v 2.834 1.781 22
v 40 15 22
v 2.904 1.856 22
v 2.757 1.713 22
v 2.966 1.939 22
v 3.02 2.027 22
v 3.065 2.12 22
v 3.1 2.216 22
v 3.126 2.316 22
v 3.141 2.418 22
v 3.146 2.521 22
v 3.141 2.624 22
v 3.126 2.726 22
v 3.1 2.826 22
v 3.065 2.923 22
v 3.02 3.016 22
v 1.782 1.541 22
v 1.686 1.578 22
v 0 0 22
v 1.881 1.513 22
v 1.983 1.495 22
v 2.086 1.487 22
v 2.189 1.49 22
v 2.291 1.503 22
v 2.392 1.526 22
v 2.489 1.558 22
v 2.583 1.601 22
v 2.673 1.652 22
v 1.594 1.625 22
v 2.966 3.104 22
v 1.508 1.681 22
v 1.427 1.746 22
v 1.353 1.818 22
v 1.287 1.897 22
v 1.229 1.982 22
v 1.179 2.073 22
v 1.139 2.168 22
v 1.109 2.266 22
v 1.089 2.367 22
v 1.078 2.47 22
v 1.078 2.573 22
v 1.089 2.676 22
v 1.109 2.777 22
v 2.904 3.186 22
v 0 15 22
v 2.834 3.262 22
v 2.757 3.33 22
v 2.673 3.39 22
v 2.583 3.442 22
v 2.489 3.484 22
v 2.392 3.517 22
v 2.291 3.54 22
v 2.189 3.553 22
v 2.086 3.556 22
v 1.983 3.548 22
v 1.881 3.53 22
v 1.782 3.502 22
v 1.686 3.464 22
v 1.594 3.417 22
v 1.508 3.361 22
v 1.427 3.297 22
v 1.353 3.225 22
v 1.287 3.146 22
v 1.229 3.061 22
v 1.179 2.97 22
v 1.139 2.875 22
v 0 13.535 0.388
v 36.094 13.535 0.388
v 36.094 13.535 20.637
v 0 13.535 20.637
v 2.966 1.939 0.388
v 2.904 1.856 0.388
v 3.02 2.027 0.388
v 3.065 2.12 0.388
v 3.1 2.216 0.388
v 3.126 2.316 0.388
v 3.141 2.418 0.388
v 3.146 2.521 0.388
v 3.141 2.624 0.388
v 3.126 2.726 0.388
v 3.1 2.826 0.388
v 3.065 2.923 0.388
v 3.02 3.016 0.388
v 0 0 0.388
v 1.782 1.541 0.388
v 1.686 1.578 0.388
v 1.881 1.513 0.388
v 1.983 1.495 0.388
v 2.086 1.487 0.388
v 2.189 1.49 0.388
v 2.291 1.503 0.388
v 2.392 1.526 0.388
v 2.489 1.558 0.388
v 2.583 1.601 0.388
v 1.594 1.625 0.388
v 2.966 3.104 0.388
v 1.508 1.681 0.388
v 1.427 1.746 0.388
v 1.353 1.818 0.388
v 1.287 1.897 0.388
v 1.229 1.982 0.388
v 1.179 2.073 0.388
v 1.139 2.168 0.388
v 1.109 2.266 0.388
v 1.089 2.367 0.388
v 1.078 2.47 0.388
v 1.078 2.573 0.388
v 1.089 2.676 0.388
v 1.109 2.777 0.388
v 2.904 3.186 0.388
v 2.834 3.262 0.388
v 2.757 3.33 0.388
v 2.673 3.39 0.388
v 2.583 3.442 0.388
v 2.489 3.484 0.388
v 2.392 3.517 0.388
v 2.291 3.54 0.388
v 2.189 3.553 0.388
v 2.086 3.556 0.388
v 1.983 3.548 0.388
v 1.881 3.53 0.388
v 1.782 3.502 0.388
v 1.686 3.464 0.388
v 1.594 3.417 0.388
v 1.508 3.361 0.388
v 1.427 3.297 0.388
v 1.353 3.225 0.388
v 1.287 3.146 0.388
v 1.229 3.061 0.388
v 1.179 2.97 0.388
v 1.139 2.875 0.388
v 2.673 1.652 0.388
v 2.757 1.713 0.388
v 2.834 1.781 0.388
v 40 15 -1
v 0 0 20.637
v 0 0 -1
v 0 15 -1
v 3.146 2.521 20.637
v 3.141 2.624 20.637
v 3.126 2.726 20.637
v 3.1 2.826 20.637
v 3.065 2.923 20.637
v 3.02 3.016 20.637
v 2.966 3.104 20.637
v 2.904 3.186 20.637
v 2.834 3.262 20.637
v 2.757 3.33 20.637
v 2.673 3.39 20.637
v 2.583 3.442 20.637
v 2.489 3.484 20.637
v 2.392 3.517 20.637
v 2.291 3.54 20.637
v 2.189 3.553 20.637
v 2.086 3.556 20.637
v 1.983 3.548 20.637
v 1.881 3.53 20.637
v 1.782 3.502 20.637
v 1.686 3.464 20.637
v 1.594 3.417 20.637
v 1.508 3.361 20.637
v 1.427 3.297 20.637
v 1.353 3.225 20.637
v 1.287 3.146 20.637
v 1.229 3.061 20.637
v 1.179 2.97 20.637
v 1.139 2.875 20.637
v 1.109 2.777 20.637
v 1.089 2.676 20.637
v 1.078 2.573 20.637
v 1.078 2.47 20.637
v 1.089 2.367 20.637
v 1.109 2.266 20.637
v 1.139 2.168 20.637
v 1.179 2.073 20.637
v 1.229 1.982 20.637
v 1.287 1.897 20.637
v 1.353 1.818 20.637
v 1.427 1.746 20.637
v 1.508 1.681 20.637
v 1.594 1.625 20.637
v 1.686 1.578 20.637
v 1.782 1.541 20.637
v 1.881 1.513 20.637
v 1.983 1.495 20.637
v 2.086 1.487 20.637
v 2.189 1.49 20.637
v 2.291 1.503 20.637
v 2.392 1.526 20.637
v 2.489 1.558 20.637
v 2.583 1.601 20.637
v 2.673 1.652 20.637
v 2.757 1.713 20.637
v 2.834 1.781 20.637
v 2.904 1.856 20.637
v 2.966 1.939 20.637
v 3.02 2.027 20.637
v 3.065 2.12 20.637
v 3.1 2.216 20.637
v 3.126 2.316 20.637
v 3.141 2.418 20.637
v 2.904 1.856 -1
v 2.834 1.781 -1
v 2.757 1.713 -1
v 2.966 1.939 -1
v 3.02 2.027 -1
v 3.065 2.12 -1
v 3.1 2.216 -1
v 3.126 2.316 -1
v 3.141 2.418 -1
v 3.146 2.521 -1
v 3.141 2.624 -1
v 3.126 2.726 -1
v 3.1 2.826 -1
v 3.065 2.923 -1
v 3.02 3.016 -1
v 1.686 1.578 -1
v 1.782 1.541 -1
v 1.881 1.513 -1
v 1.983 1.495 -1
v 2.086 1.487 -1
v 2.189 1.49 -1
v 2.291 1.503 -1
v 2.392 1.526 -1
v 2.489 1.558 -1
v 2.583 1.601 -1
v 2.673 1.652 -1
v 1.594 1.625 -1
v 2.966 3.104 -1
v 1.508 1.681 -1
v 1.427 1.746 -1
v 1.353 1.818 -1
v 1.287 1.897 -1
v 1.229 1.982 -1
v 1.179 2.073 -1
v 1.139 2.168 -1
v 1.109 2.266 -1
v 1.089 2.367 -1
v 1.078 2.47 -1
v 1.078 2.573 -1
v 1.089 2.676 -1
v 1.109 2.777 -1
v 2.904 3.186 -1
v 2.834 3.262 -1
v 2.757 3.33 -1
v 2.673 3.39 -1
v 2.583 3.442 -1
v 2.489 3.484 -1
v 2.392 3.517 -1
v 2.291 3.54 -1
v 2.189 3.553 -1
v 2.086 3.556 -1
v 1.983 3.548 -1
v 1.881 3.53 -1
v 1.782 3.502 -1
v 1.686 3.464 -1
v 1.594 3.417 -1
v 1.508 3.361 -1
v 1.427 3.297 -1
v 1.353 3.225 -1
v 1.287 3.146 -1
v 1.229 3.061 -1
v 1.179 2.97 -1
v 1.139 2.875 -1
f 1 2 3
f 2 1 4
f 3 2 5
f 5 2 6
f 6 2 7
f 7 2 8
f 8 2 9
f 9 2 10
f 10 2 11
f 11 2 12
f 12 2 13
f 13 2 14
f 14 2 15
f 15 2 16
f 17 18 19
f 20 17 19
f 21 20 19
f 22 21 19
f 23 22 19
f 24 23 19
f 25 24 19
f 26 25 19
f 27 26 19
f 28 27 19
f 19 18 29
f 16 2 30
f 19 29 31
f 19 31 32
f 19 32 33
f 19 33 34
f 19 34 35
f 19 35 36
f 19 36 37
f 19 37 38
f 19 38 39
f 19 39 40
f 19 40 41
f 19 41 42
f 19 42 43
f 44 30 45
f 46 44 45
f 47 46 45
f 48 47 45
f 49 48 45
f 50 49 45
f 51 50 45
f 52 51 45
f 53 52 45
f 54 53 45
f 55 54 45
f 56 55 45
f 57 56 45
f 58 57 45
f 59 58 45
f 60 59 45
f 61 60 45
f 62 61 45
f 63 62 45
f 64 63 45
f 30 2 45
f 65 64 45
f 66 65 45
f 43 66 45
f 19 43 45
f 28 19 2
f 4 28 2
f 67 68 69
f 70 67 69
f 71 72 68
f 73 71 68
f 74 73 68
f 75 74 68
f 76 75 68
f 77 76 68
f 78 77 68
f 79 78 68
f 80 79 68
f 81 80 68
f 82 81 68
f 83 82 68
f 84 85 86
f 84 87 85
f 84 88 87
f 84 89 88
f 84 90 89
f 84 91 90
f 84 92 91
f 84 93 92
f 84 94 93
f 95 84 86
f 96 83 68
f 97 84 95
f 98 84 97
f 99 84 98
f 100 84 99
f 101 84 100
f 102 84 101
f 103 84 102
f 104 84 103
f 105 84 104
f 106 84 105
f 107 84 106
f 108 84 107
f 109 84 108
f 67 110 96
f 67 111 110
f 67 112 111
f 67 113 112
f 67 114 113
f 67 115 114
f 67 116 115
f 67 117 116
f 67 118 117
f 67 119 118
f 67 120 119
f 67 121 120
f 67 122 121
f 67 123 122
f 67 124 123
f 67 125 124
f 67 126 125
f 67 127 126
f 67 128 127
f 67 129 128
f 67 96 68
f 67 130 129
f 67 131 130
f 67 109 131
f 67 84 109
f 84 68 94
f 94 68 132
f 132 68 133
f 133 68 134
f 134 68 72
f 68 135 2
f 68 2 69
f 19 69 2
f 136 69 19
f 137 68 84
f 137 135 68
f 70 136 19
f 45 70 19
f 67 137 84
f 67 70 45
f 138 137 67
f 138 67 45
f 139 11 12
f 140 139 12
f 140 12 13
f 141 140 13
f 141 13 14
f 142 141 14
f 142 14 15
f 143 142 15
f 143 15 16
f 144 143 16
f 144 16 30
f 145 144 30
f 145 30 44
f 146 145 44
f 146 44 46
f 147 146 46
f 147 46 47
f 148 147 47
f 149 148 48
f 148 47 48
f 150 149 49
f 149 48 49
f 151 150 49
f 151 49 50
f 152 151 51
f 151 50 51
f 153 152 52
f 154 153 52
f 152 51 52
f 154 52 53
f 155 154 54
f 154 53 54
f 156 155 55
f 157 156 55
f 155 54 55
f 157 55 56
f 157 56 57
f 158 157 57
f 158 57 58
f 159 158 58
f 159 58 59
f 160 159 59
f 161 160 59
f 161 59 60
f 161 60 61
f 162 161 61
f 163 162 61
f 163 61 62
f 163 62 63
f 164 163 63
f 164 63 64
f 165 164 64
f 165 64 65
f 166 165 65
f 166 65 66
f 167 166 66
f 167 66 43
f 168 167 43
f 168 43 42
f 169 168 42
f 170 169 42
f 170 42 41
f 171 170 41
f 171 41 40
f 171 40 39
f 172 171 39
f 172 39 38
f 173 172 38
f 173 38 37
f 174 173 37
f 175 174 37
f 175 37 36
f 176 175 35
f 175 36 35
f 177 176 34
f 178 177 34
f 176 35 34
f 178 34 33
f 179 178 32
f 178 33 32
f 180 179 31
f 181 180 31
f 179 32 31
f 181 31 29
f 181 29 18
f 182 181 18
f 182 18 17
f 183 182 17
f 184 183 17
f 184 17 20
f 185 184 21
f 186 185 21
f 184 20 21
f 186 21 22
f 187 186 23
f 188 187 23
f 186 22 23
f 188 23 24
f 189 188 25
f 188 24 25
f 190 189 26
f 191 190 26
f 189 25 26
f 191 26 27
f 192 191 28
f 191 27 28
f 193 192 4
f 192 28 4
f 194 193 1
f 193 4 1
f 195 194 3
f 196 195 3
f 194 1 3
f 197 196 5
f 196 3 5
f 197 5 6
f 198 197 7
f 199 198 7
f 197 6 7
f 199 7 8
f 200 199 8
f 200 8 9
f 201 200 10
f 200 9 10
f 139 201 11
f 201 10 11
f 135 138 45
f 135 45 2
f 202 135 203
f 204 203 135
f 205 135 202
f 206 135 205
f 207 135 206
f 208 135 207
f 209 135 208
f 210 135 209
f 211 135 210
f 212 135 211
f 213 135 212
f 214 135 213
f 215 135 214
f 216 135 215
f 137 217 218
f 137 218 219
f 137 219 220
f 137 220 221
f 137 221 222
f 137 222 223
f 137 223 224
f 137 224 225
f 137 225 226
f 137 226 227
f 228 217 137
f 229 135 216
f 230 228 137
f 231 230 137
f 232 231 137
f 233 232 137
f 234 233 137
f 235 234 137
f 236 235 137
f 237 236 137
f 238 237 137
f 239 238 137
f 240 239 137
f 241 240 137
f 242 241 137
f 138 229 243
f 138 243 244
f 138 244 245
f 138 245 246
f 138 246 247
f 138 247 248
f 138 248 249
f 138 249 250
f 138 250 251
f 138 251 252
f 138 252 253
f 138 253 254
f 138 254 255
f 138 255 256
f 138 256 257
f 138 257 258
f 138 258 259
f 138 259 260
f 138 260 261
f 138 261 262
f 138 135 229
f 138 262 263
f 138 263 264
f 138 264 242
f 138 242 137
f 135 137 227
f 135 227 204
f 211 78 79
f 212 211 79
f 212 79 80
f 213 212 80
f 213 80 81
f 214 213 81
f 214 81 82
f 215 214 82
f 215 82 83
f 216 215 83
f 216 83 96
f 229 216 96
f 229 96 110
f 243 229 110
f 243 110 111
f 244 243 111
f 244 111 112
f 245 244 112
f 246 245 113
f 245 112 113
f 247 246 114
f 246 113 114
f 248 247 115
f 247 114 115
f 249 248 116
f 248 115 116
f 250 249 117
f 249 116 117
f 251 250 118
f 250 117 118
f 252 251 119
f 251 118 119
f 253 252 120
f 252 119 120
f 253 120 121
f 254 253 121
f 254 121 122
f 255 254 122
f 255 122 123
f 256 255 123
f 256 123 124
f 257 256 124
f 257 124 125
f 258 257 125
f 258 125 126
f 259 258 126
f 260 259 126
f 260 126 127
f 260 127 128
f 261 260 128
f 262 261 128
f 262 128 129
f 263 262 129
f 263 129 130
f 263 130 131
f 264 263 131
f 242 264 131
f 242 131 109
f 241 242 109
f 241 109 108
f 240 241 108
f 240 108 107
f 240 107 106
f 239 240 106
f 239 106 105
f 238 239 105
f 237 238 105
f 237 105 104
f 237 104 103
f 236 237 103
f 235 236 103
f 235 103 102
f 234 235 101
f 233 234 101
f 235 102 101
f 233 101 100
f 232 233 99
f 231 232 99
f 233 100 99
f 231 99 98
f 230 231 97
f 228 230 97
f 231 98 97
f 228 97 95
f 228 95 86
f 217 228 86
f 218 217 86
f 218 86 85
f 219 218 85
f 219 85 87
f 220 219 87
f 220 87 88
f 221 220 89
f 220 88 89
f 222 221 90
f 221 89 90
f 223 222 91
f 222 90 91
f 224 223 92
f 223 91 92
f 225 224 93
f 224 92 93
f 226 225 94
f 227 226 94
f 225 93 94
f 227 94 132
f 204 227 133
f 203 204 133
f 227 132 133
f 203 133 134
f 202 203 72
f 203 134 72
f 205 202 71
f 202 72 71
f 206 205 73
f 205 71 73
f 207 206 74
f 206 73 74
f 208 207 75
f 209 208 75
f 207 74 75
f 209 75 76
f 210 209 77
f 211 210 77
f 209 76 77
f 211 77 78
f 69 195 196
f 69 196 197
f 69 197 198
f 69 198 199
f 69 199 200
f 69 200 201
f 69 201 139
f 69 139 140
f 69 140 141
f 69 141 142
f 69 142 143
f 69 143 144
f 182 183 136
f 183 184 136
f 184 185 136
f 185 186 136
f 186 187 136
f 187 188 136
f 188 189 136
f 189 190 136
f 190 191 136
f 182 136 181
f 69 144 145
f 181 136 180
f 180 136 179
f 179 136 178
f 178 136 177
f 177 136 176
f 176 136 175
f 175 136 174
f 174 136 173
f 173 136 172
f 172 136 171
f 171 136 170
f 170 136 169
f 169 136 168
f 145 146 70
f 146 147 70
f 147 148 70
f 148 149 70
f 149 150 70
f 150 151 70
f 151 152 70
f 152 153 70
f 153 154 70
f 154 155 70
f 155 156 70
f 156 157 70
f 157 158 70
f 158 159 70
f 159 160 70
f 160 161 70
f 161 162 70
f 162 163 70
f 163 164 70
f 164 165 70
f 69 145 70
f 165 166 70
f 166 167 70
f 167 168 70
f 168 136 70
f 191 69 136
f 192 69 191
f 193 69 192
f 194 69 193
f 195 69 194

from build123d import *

# Parameters (mm, degrees)
BOSS_EXTRUDE2_DEPTH      = 22
BOSS_EXTRUDE2_DEPTH_BACK = 1
SKETCH2_W                = 20.249570214
SKETCH2_H                = 13.731042716
CUT_EXTRUDE1_DEPTH       = 43
SKETCH3_R                = 1.034515854
CUT_EXTRUDE2_DEPTH       = 43


with BuildPart() as part:
    # Sketch1 → Boss-Extrude2 (new, two sides: drawn at the far end of the back side and taken through both)
    with BuildSketch(Plane.XY.offset(-BOSS_EXTRUDE2_DEPTH_BACK)):
        Polygon((0, 0), (0, 15), (40, 15), align=None)
    extrude(amount=BOSS_EXTRUDE2_DEPTH + BOSS_EXTRUDE2_DEPTH_BACK)

    # Sketch2 → Cut-Extrude1 (cut)
    with BuildSketch(Plane.ZY):
        with Locations((10.512392638, 6.669693265)):
            Rectangle(SKETCH2_W, SKETCH2_H)
    extrude(amount=-CUT_EXTRUDE1_DEPTH, mode=Mode.SUBTRACT)

    # Sketch3 → Cut-Extrude2 (cut)
    with BuildSketch(Plane.XY.offset(22)):
        with Locations((2.111496697, 2.521392454)):
            Circle(SKETCH3_R)
    extrude(amount=-CUT_EXTRUDE2_DEPTH, mode=Mode.SUBTRACT)


solid = part.part
